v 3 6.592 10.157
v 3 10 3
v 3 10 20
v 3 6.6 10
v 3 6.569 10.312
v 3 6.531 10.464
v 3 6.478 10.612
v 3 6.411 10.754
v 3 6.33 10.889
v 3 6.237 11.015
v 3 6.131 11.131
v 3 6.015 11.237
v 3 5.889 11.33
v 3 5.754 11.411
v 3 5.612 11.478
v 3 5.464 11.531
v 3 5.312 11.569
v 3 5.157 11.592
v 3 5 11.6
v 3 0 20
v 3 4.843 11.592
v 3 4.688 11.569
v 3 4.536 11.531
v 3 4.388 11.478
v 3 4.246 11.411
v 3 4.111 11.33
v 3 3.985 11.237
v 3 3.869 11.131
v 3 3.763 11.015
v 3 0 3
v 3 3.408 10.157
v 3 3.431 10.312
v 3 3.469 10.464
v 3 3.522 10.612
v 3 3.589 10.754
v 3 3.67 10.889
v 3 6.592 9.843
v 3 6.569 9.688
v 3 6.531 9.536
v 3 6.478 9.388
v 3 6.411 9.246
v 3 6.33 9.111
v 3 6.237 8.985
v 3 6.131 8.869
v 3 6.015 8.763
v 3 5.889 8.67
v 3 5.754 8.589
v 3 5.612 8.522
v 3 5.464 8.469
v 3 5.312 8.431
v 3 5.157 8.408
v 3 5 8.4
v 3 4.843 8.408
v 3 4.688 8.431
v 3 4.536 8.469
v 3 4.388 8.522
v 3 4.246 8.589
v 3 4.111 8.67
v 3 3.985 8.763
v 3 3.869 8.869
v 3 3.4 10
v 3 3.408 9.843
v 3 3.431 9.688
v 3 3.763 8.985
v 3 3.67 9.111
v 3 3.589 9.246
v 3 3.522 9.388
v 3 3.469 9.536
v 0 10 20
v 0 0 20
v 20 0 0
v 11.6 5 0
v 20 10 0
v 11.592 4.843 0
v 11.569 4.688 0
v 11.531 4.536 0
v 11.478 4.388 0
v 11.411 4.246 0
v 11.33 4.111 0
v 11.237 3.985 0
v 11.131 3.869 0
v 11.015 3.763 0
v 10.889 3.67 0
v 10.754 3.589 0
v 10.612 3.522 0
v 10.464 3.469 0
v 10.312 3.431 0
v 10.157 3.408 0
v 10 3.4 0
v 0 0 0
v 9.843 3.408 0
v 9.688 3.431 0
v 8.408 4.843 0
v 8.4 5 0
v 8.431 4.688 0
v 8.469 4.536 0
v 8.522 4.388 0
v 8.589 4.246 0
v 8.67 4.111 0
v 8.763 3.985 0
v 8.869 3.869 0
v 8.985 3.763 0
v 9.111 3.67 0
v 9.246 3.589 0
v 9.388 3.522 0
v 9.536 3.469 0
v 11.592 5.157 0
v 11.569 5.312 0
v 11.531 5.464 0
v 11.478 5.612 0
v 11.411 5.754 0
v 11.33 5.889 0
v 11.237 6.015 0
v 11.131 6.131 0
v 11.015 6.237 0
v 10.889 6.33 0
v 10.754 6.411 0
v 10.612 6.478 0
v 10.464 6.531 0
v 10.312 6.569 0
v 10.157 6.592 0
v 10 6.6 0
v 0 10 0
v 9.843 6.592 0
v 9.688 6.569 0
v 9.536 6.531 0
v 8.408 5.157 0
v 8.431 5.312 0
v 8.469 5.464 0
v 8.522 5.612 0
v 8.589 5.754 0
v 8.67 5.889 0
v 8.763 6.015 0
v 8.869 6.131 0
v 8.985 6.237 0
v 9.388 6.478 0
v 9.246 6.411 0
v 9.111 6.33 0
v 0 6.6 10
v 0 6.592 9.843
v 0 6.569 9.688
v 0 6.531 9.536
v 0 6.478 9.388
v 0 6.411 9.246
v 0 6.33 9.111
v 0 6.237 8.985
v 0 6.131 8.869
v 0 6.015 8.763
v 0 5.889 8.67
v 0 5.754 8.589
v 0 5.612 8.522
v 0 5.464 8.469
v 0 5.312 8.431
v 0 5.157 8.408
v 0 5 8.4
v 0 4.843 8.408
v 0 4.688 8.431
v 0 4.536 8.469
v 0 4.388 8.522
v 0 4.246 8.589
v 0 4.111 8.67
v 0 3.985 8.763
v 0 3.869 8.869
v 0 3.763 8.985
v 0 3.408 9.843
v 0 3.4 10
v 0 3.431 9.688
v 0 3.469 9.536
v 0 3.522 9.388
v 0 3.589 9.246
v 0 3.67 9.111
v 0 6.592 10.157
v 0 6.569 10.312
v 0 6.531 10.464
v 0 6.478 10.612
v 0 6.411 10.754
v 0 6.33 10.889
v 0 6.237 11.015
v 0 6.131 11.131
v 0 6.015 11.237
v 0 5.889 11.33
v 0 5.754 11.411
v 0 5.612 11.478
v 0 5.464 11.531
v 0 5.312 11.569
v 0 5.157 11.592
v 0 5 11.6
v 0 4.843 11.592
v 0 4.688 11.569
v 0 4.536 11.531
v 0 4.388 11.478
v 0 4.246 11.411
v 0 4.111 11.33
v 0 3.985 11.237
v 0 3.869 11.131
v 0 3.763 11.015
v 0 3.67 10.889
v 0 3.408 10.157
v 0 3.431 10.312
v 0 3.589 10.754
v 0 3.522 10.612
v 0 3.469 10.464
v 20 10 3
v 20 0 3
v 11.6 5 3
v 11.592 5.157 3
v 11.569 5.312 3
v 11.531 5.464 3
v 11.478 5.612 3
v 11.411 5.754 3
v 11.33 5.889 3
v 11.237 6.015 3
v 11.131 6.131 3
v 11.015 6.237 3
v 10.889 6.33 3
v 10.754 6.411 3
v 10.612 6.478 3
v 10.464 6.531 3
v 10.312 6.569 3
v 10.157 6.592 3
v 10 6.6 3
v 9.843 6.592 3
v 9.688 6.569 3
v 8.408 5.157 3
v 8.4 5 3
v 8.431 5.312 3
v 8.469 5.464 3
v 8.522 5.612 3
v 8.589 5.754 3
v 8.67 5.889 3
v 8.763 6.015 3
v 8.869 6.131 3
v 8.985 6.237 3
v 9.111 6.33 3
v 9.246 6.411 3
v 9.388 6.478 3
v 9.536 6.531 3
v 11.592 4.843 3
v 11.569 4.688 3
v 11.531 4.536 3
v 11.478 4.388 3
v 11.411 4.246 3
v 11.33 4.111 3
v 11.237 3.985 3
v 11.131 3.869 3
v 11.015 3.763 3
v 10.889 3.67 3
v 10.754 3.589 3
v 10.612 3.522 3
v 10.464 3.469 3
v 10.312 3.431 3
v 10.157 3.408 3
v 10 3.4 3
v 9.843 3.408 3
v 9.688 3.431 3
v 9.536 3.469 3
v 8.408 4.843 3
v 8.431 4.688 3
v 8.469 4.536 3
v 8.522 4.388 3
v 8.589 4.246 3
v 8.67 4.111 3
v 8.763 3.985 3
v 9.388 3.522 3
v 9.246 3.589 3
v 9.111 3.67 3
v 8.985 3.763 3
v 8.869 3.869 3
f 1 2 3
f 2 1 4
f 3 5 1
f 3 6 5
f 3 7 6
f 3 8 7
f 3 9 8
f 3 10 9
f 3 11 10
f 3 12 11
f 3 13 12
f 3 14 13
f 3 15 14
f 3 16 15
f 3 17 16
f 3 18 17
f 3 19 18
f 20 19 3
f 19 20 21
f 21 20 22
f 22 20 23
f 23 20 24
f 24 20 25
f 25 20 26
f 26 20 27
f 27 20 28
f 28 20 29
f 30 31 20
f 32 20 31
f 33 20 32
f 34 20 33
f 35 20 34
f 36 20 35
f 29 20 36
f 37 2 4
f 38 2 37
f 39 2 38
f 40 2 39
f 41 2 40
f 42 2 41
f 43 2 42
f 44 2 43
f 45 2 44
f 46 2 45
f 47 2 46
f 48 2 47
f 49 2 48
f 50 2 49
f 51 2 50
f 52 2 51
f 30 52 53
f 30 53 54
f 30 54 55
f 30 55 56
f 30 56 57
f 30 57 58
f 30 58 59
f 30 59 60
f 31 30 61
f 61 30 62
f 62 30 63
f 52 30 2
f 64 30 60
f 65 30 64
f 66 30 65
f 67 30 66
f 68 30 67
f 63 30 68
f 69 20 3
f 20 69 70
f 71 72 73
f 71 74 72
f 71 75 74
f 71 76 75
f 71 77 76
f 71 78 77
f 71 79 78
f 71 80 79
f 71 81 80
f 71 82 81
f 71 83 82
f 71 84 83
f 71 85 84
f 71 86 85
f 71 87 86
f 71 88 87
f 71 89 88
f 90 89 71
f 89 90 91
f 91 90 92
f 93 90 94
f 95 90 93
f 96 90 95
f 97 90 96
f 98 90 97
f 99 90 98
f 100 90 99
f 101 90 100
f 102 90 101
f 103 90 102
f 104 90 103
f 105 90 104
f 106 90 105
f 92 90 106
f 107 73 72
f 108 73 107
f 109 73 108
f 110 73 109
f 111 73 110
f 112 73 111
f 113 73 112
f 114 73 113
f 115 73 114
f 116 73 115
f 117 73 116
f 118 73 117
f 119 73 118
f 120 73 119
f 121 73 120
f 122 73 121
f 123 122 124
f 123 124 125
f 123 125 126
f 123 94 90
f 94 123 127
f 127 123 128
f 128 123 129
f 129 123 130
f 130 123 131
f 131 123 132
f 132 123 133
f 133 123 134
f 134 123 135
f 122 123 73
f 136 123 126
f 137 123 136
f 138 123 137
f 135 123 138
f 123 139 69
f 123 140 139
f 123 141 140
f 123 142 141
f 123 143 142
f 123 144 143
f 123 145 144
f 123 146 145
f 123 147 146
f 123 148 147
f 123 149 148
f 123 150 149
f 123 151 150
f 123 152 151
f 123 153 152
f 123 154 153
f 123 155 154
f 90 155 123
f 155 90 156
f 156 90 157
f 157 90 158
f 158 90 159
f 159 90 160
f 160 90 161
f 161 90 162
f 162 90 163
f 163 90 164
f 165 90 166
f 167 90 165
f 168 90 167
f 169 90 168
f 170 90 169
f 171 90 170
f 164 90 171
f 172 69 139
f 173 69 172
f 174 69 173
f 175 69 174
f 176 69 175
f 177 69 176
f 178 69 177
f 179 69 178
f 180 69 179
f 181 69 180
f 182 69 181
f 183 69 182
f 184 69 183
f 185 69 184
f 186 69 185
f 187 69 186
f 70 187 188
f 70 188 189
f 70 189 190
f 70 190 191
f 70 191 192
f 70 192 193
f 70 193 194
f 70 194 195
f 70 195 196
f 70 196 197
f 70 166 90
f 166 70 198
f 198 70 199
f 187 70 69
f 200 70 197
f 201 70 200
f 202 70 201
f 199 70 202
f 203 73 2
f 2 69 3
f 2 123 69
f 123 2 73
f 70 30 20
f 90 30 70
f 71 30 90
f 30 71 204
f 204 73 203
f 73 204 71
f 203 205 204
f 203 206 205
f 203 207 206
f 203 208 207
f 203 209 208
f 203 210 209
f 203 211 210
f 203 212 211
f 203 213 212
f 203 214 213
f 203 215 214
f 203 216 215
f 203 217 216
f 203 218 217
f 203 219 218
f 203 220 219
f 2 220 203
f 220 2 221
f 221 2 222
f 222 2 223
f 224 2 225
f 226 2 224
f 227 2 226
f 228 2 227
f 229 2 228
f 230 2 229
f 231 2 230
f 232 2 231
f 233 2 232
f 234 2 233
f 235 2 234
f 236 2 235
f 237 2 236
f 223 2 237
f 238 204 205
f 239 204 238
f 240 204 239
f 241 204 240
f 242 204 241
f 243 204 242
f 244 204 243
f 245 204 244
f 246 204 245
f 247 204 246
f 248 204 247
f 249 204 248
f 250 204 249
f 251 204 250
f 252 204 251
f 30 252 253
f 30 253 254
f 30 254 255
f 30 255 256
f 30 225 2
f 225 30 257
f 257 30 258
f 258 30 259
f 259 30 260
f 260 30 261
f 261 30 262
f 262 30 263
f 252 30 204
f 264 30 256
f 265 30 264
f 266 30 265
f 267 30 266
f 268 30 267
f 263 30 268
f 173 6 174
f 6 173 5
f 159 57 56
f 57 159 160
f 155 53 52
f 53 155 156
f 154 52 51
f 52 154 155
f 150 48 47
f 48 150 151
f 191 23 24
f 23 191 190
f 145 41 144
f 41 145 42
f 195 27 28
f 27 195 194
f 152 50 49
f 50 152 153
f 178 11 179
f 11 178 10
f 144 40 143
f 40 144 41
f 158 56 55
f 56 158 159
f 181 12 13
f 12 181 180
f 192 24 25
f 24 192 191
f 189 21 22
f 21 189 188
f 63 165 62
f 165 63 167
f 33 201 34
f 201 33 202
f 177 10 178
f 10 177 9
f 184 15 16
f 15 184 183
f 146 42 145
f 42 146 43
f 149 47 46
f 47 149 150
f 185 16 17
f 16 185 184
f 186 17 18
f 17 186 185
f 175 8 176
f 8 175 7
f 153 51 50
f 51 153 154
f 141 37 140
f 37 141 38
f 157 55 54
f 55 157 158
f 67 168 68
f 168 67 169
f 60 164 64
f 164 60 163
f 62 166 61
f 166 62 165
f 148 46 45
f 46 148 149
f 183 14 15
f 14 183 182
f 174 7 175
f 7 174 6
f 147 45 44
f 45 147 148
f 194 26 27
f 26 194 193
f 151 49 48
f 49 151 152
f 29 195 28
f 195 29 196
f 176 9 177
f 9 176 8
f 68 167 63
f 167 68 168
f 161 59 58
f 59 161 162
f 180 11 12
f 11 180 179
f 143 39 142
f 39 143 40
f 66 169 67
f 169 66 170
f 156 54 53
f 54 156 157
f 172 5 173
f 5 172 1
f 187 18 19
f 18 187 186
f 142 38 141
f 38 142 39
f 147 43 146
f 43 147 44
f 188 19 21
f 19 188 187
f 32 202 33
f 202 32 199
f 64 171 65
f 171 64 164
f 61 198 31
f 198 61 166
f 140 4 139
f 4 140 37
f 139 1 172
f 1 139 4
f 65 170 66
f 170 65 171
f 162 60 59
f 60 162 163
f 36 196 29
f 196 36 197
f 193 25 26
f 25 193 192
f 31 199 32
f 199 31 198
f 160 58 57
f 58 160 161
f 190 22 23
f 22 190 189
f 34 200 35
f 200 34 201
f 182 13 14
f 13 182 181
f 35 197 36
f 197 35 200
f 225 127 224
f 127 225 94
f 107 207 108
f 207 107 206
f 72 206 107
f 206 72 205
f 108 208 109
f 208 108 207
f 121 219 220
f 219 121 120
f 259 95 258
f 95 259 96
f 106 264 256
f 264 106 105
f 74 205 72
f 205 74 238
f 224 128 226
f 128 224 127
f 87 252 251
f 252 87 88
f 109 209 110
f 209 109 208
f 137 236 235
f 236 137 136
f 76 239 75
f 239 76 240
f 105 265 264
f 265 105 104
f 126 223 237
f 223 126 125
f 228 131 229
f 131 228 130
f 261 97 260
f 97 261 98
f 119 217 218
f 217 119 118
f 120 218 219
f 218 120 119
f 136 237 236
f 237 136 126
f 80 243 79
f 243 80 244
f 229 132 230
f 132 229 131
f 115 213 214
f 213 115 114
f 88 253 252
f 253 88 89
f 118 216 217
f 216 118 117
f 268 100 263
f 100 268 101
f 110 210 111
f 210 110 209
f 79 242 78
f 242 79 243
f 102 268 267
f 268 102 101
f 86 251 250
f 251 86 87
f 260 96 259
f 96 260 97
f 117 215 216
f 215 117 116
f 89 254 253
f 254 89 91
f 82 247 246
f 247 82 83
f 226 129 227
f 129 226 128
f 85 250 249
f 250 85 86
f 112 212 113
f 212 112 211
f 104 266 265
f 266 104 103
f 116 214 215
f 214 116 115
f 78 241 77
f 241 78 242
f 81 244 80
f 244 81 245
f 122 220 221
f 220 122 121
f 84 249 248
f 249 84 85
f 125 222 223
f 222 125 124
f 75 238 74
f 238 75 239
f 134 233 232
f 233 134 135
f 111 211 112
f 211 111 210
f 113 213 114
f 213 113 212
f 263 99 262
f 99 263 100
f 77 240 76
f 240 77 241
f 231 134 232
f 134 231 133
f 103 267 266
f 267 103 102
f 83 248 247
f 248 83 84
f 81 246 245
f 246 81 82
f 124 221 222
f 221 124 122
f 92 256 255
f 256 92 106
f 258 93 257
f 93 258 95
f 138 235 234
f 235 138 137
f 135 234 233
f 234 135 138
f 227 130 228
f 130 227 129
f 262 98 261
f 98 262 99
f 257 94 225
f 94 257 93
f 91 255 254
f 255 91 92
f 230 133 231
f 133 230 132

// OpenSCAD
// Params (unchanged)
bracket_length = 20;
bracket_thickness = 3;
bracket_width = 10;
hole_diameter = 3.2;
hole_distance = 10;
$fn = 64;  // smoother circles

module l_bracket() {
    difference() {
        union() {
            // Vertical leg (x=thickness, y=width, z=length)
            cube([bracket_thickness, bracket_width, bracket_length]);
            // Horizontal leg (x=length, y=width, z=thickness)
            cube([bracket_length, bracket_width, bracket_thickness]);
        }

        // Hole in vertical leg: axis should be X -> rotate cylinder 90° around Y
        translate([bracket_thickness/2, bracket_width/2, hole_distance])
            rotate([0,90,0])
                cylinder(h = bracket_thickness + 2, d = hole_diameter, center = true);

        // Hole in horizontal leg: axis is Z already, so no rotate needed
        translate([hole_distance, bracket_width/2, bracket_thickness/2])
            cylinder(h = bracket_thickness + 2, d = hole_diameter, center = true);
    }
}

l_bracket();
